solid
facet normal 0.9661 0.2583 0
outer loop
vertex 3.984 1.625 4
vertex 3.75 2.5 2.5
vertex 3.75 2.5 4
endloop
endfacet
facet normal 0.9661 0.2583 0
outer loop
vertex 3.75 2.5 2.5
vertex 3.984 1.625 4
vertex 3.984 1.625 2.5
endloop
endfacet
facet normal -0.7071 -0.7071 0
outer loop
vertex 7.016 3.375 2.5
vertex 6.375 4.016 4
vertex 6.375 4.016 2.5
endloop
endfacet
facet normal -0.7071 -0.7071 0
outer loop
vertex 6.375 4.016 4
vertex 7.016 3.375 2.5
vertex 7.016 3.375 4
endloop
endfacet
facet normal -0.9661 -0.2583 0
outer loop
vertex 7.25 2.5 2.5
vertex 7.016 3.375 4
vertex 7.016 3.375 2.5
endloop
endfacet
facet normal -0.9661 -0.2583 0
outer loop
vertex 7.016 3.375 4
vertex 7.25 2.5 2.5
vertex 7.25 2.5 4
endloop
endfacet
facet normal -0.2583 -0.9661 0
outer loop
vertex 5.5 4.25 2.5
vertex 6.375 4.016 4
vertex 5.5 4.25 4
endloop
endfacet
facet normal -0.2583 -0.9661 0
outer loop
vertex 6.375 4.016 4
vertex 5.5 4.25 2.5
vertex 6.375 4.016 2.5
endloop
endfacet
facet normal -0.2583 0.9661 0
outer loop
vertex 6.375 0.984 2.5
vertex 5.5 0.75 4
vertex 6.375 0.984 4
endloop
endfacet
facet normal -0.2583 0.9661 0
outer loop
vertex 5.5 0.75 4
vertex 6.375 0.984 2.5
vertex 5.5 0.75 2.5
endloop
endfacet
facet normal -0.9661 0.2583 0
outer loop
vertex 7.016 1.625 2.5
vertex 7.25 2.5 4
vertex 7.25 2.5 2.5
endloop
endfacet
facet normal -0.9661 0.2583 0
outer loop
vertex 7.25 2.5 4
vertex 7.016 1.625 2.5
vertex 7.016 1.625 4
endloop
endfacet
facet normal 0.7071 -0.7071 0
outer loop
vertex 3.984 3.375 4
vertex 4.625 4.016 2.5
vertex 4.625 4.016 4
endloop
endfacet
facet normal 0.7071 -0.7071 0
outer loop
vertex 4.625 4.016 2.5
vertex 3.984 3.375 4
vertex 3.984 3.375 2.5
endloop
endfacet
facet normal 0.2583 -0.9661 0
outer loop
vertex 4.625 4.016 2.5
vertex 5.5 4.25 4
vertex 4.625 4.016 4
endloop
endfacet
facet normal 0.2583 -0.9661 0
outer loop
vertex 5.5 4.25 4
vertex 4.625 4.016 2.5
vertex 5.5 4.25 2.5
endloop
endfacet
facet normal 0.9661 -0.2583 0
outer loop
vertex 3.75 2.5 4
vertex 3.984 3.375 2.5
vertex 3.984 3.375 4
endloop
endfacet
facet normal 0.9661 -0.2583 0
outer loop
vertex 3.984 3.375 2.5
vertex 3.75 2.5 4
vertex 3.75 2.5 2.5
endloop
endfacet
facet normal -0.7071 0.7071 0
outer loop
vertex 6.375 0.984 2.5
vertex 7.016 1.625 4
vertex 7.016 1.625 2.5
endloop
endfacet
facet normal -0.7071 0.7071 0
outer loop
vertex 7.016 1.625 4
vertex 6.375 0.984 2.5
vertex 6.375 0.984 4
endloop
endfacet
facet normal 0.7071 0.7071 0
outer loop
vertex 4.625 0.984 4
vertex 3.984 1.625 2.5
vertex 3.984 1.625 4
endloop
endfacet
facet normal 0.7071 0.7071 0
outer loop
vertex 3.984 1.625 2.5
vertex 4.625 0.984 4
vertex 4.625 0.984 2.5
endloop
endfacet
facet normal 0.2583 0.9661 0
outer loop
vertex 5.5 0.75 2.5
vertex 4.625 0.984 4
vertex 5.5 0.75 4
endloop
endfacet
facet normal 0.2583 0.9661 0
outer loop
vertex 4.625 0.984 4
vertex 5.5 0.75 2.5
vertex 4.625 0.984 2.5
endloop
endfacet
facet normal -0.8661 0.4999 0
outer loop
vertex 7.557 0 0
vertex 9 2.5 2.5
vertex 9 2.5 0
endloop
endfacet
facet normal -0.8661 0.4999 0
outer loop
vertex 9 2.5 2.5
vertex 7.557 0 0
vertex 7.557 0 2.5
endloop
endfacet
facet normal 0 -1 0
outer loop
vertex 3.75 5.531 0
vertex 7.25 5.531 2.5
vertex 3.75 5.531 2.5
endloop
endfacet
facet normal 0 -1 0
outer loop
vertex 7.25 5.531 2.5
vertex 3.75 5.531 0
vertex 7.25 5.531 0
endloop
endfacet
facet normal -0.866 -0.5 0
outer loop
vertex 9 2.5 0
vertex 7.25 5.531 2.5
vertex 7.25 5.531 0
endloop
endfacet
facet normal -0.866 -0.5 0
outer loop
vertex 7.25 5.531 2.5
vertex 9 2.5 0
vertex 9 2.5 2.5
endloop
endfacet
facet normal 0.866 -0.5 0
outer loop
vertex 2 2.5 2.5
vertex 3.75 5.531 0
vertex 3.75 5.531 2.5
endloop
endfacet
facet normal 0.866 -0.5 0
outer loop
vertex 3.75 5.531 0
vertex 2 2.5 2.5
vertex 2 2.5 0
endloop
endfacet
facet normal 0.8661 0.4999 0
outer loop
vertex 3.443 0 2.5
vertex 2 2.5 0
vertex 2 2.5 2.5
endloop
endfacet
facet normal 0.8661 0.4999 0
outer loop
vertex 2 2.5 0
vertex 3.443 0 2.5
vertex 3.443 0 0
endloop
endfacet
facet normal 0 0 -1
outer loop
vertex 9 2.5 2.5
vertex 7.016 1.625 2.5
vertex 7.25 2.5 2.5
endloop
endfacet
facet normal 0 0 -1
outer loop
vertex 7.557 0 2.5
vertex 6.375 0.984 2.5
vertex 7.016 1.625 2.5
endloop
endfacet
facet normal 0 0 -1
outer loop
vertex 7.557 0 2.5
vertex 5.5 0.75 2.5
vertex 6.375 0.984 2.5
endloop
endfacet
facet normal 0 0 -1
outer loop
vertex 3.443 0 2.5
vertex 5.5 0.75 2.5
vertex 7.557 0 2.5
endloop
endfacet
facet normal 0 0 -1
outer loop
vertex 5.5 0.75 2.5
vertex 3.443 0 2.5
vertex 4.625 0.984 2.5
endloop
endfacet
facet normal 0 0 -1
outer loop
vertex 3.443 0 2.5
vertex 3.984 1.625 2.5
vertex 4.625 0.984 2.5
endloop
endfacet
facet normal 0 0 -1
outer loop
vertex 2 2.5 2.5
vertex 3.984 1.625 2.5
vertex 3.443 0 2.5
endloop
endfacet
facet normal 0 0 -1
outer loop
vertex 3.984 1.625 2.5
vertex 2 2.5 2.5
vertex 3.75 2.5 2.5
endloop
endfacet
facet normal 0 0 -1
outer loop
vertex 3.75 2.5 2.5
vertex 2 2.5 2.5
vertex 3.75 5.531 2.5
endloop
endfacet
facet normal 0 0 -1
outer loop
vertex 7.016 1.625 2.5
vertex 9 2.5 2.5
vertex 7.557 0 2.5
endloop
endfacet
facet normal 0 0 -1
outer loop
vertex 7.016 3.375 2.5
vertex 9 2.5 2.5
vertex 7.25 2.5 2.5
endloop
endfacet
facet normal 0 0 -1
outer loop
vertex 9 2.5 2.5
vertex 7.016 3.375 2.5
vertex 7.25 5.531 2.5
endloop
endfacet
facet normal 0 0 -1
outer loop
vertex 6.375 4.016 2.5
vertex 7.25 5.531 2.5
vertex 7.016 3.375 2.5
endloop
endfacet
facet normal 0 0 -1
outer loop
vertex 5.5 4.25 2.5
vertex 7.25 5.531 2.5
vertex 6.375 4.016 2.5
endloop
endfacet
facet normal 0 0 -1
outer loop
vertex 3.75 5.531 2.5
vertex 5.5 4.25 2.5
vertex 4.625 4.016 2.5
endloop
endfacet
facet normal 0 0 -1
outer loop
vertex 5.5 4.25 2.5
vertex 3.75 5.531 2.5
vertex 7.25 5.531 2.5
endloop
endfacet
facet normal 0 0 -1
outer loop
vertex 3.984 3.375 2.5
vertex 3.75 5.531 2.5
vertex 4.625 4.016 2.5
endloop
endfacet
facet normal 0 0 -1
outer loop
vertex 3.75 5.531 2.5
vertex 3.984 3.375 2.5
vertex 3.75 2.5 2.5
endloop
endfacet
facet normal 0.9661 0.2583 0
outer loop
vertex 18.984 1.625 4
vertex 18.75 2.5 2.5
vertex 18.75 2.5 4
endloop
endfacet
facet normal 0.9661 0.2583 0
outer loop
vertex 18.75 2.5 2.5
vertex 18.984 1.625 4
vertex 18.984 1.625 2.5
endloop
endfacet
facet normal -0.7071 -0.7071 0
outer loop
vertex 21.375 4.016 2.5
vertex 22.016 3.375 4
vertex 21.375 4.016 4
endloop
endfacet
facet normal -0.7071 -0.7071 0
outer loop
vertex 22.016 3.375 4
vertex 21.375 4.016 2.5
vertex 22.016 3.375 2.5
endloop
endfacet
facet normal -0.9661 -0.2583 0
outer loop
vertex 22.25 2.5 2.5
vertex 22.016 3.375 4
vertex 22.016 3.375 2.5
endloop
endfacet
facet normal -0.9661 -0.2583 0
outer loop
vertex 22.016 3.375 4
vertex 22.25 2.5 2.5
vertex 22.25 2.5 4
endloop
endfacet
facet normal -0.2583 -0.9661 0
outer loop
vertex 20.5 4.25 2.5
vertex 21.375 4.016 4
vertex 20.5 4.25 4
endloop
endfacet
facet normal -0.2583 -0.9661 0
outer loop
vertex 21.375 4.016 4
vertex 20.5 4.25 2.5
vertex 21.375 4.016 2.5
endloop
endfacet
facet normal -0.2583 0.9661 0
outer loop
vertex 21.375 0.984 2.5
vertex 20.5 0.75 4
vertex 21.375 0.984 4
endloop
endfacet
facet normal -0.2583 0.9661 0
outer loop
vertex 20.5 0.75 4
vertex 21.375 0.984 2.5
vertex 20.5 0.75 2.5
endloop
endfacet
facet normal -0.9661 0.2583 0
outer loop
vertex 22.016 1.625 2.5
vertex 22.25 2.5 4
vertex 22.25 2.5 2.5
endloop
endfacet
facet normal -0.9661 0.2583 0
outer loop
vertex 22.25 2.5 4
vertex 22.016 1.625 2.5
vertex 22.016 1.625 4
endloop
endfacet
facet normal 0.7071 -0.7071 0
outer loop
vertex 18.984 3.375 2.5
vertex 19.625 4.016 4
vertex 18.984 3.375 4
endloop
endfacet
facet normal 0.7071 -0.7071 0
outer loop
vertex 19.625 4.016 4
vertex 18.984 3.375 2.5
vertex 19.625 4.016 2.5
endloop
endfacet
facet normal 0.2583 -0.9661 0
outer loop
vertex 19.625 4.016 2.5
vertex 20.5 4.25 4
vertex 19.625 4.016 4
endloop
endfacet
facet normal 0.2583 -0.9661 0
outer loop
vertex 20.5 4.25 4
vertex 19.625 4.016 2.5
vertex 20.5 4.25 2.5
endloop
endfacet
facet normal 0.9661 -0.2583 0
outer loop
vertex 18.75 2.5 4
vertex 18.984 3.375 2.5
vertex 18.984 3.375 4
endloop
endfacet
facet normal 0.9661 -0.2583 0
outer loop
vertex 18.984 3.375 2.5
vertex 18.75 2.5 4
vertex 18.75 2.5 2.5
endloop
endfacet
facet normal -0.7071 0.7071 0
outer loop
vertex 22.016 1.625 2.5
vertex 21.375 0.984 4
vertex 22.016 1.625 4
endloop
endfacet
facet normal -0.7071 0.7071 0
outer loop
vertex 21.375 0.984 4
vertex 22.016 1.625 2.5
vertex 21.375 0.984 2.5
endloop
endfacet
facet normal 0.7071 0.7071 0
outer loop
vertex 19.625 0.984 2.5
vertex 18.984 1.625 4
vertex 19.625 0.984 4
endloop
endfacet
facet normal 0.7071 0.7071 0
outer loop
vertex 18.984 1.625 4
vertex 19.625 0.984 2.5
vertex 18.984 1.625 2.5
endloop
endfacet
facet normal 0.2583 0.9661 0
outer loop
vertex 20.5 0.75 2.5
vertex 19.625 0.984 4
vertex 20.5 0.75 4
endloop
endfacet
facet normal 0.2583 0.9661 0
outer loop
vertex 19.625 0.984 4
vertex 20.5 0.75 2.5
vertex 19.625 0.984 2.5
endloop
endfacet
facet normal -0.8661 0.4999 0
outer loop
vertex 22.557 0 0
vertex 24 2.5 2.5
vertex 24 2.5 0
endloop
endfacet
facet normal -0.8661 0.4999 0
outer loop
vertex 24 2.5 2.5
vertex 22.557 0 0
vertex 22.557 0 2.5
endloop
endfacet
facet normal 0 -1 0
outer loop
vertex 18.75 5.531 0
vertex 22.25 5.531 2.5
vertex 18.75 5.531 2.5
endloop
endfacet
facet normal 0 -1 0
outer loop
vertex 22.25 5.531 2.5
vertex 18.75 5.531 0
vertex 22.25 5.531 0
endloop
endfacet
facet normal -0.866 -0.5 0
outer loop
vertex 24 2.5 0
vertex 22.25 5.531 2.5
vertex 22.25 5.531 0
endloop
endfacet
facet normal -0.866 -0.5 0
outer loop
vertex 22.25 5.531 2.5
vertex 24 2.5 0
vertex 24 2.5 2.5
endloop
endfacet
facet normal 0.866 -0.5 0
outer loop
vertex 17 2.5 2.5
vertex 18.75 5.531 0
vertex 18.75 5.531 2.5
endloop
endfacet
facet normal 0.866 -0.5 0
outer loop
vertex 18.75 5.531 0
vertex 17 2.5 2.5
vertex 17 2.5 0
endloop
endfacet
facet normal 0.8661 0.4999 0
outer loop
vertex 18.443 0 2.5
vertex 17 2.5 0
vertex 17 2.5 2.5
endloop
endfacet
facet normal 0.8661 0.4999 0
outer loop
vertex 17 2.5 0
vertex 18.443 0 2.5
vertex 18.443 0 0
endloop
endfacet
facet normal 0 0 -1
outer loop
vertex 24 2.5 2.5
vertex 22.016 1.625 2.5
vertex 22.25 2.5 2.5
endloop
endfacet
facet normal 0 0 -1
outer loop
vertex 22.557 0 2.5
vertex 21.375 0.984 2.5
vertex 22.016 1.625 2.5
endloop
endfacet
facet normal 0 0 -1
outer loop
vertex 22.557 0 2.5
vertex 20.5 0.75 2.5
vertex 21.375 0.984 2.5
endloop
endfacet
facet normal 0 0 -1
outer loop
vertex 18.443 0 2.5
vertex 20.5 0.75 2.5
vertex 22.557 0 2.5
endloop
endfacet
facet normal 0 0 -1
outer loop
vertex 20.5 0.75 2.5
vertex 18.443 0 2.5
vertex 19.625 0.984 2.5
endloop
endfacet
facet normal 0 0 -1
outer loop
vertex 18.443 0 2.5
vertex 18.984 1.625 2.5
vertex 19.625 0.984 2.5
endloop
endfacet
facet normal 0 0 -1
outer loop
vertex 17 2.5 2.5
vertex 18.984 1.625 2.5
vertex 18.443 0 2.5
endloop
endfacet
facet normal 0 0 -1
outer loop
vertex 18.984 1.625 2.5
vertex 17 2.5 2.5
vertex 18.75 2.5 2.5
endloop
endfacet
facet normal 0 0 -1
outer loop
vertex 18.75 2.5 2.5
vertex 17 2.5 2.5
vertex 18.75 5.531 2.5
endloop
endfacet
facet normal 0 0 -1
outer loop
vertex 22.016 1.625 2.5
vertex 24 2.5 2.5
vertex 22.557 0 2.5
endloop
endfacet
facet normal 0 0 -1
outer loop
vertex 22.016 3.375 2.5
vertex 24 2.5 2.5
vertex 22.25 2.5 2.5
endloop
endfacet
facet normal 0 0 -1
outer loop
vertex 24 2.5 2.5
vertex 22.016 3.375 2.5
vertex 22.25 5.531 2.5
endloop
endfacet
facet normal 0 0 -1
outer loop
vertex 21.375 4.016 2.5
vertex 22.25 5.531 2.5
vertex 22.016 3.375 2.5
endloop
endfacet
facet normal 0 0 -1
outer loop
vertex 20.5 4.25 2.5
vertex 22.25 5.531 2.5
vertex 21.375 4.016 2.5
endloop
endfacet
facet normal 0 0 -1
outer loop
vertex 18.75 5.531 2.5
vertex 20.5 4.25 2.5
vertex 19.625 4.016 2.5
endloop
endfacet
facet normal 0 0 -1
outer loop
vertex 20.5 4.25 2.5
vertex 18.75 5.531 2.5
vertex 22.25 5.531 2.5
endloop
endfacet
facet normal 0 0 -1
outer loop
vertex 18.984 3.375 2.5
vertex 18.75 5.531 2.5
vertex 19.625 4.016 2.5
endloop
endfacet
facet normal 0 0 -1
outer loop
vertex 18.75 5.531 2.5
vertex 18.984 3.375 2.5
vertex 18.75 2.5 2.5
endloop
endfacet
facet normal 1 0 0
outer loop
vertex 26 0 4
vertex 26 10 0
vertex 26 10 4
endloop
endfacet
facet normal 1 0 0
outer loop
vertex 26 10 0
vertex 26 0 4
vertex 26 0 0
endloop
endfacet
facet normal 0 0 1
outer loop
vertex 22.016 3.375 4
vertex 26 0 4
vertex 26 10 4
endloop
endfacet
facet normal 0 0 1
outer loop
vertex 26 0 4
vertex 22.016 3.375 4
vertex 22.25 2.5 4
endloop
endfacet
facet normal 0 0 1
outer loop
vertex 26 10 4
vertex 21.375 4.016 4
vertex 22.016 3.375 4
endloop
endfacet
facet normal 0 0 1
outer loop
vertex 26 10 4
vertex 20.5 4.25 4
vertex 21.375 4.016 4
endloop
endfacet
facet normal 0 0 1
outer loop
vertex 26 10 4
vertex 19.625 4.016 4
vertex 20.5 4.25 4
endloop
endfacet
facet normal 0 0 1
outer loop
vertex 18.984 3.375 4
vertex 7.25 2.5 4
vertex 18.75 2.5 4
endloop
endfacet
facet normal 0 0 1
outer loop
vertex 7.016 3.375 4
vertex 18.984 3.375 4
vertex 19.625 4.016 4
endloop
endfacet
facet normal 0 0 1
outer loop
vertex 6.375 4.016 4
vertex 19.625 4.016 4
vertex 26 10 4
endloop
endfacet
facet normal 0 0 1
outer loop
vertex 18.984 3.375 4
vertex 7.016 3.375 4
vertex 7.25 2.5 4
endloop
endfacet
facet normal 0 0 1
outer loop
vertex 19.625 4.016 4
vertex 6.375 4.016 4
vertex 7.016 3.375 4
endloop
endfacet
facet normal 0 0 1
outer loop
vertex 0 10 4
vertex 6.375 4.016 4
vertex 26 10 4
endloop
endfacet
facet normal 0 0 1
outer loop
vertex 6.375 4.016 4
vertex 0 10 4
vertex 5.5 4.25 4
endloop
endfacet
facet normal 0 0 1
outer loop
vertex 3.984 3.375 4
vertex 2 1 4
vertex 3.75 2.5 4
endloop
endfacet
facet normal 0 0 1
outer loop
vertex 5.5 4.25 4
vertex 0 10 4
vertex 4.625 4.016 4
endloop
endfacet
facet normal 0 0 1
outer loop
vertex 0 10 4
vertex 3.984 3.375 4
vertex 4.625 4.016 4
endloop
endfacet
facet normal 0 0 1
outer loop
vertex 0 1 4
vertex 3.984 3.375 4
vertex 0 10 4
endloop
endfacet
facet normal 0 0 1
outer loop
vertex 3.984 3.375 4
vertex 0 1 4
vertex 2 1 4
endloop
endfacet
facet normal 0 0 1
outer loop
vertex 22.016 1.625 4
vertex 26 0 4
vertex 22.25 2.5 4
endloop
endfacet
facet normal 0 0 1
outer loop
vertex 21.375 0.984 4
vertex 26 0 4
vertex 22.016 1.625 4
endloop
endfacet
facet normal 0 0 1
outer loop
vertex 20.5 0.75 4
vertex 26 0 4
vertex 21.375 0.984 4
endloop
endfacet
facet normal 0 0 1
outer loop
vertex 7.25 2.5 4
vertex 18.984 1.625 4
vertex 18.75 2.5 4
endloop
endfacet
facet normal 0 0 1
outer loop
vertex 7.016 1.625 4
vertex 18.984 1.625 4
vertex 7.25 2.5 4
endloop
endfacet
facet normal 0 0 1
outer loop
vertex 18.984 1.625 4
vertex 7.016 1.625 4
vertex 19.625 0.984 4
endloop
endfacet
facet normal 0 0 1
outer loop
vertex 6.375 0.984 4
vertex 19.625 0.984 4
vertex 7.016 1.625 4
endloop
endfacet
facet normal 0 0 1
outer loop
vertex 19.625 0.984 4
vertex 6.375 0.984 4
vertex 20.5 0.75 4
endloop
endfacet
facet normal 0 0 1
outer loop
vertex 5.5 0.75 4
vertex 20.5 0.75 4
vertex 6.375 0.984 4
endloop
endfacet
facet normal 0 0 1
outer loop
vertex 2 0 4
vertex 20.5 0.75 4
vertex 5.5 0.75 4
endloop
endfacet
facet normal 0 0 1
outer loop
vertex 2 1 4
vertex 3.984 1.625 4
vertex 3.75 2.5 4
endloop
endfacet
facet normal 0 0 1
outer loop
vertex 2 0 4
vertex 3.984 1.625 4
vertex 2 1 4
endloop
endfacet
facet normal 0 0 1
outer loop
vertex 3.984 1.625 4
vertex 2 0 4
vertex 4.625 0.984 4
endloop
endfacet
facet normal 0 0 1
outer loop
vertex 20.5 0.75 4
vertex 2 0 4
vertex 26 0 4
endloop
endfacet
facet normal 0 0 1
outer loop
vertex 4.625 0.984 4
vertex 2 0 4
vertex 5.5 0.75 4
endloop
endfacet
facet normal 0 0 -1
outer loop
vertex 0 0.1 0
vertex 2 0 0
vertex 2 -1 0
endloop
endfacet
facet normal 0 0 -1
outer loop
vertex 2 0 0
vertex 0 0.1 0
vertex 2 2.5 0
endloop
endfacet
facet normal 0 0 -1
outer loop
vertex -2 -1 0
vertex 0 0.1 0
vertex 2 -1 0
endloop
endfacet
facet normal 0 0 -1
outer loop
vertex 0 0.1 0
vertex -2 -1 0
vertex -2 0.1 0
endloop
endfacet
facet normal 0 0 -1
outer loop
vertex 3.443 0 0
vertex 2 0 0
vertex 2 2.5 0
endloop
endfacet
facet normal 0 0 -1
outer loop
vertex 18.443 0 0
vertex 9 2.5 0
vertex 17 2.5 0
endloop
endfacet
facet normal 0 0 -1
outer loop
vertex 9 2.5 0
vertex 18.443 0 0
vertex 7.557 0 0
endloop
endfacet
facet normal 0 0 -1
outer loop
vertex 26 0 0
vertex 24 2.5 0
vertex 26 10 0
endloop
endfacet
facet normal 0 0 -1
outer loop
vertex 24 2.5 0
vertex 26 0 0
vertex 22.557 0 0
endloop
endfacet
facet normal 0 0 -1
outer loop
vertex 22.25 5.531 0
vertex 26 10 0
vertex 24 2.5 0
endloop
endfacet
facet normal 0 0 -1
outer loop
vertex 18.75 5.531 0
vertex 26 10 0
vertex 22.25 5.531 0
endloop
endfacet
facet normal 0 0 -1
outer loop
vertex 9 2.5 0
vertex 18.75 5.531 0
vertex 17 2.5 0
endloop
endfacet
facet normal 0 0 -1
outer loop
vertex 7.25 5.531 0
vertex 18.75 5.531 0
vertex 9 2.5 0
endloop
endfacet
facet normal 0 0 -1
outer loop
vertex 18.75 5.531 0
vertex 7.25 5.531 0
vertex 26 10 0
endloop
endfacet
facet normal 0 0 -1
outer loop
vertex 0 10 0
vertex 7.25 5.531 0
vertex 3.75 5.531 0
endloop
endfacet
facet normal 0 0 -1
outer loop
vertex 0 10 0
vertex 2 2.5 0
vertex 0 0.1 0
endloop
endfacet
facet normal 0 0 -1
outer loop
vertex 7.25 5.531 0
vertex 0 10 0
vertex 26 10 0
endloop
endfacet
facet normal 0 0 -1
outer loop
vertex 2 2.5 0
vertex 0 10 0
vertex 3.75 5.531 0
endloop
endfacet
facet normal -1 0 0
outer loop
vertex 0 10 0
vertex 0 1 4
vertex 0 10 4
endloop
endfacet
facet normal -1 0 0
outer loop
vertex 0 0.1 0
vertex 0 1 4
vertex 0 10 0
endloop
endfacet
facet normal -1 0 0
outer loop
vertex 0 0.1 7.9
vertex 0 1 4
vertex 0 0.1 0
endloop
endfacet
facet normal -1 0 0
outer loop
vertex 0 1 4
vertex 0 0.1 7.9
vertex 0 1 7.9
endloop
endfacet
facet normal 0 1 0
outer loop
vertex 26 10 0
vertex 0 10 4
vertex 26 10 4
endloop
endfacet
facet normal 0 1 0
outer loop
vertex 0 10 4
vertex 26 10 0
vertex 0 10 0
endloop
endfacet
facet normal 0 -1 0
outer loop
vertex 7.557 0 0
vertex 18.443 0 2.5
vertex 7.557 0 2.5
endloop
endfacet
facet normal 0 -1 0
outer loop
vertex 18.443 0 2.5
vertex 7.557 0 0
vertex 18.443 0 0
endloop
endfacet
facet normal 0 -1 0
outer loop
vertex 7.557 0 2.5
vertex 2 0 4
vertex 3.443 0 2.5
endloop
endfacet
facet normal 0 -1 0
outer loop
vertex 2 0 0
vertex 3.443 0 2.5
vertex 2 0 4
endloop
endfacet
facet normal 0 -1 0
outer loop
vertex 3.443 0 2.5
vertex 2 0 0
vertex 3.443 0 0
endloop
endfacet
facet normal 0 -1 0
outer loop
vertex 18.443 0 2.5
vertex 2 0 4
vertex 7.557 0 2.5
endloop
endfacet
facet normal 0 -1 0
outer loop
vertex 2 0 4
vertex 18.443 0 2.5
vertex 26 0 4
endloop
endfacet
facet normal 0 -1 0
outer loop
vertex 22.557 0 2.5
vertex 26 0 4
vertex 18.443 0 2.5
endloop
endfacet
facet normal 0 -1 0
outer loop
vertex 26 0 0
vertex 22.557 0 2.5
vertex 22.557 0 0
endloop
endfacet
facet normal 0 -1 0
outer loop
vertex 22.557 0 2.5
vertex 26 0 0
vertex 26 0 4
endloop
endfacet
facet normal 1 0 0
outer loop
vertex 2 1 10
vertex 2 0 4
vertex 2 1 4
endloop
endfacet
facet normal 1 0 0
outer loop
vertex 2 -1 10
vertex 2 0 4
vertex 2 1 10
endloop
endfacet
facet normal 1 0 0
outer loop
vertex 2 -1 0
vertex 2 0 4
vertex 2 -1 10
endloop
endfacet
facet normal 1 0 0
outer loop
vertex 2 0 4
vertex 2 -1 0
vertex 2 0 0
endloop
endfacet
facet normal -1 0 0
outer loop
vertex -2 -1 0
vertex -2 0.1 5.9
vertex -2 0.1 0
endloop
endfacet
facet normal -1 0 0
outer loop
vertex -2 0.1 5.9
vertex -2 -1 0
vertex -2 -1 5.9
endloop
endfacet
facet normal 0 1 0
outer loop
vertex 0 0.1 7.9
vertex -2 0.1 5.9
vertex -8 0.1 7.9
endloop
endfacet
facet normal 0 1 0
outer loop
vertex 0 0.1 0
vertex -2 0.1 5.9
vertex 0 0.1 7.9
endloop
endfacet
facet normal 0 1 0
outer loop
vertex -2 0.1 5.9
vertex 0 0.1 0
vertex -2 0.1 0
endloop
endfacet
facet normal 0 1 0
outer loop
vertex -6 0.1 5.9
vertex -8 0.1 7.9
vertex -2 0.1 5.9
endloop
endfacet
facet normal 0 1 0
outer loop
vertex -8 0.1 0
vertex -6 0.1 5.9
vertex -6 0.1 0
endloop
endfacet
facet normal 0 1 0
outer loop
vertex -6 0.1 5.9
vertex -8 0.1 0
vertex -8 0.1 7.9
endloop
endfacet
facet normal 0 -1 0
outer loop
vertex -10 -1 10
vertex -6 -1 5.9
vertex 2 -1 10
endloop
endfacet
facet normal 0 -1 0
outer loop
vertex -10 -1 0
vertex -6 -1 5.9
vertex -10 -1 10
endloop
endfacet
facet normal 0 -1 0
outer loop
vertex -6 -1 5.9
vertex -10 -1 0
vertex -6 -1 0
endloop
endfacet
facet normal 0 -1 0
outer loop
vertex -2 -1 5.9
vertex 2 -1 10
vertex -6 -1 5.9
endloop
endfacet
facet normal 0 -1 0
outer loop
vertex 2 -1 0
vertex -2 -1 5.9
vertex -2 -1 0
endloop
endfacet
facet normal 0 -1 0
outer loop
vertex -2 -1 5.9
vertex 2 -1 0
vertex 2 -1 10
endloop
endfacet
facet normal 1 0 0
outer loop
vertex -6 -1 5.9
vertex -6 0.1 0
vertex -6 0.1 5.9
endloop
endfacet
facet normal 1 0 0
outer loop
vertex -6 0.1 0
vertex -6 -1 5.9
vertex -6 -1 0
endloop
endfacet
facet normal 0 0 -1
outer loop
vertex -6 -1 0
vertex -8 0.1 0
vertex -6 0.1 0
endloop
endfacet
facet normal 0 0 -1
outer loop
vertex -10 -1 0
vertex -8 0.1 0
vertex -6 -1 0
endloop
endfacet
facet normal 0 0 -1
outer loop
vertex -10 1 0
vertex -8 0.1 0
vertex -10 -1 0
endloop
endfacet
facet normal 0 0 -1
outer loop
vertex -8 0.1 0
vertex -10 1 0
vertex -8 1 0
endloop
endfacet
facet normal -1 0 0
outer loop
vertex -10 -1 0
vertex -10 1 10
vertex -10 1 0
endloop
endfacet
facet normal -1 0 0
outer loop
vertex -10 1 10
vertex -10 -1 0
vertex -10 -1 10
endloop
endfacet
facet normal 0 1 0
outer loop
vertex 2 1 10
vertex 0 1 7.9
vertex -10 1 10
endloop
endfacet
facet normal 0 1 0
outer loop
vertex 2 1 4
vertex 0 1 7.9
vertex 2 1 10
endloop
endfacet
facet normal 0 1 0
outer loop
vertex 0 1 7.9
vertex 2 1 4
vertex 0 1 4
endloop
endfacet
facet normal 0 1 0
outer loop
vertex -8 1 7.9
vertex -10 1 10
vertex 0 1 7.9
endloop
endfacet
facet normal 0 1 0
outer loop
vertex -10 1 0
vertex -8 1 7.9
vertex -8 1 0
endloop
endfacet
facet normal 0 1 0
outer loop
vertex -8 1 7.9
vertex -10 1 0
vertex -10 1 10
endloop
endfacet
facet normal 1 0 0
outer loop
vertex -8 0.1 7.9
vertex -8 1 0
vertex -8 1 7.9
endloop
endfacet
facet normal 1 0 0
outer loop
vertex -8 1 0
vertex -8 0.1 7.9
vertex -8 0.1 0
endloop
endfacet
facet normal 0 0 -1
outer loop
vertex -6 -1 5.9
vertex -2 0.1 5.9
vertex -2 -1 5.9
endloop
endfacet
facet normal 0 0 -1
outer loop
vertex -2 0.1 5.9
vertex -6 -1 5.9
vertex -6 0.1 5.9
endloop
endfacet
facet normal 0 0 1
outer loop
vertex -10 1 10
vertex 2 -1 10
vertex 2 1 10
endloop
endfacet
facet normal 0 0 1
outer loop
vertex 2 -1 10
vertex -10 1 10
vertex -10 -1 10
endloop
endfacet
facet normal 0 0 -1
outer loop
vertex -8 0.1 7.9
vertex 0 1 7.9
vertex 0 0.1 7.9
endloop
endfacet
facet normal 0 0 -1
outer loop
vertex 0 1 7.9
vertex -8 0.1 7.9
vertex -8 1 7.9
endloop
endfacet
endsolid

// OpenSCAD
difference() {
	cube([26,10,4]);
	for (x= [5.5,20.5])
		translate([x,2.5,-1]) {
			cylinder(6,d=3.5,$fn=12);
			cylinder(3.5,d=7,$fn=6);
		}
}
translate([-2,-1,0]) cube([4,1.1,6]);
translate([-10,-1,0]) cube([4,1.1,6]);
translate([0,0,0]) cube([2,1,8]);
translate([-10,0,0]) cube([2,1,8]);
translate([-10,-1,5.9]) cube([12,1.1,2.2]);
translate([-10,-1,7.9]) cube([12,2,2.1]);
